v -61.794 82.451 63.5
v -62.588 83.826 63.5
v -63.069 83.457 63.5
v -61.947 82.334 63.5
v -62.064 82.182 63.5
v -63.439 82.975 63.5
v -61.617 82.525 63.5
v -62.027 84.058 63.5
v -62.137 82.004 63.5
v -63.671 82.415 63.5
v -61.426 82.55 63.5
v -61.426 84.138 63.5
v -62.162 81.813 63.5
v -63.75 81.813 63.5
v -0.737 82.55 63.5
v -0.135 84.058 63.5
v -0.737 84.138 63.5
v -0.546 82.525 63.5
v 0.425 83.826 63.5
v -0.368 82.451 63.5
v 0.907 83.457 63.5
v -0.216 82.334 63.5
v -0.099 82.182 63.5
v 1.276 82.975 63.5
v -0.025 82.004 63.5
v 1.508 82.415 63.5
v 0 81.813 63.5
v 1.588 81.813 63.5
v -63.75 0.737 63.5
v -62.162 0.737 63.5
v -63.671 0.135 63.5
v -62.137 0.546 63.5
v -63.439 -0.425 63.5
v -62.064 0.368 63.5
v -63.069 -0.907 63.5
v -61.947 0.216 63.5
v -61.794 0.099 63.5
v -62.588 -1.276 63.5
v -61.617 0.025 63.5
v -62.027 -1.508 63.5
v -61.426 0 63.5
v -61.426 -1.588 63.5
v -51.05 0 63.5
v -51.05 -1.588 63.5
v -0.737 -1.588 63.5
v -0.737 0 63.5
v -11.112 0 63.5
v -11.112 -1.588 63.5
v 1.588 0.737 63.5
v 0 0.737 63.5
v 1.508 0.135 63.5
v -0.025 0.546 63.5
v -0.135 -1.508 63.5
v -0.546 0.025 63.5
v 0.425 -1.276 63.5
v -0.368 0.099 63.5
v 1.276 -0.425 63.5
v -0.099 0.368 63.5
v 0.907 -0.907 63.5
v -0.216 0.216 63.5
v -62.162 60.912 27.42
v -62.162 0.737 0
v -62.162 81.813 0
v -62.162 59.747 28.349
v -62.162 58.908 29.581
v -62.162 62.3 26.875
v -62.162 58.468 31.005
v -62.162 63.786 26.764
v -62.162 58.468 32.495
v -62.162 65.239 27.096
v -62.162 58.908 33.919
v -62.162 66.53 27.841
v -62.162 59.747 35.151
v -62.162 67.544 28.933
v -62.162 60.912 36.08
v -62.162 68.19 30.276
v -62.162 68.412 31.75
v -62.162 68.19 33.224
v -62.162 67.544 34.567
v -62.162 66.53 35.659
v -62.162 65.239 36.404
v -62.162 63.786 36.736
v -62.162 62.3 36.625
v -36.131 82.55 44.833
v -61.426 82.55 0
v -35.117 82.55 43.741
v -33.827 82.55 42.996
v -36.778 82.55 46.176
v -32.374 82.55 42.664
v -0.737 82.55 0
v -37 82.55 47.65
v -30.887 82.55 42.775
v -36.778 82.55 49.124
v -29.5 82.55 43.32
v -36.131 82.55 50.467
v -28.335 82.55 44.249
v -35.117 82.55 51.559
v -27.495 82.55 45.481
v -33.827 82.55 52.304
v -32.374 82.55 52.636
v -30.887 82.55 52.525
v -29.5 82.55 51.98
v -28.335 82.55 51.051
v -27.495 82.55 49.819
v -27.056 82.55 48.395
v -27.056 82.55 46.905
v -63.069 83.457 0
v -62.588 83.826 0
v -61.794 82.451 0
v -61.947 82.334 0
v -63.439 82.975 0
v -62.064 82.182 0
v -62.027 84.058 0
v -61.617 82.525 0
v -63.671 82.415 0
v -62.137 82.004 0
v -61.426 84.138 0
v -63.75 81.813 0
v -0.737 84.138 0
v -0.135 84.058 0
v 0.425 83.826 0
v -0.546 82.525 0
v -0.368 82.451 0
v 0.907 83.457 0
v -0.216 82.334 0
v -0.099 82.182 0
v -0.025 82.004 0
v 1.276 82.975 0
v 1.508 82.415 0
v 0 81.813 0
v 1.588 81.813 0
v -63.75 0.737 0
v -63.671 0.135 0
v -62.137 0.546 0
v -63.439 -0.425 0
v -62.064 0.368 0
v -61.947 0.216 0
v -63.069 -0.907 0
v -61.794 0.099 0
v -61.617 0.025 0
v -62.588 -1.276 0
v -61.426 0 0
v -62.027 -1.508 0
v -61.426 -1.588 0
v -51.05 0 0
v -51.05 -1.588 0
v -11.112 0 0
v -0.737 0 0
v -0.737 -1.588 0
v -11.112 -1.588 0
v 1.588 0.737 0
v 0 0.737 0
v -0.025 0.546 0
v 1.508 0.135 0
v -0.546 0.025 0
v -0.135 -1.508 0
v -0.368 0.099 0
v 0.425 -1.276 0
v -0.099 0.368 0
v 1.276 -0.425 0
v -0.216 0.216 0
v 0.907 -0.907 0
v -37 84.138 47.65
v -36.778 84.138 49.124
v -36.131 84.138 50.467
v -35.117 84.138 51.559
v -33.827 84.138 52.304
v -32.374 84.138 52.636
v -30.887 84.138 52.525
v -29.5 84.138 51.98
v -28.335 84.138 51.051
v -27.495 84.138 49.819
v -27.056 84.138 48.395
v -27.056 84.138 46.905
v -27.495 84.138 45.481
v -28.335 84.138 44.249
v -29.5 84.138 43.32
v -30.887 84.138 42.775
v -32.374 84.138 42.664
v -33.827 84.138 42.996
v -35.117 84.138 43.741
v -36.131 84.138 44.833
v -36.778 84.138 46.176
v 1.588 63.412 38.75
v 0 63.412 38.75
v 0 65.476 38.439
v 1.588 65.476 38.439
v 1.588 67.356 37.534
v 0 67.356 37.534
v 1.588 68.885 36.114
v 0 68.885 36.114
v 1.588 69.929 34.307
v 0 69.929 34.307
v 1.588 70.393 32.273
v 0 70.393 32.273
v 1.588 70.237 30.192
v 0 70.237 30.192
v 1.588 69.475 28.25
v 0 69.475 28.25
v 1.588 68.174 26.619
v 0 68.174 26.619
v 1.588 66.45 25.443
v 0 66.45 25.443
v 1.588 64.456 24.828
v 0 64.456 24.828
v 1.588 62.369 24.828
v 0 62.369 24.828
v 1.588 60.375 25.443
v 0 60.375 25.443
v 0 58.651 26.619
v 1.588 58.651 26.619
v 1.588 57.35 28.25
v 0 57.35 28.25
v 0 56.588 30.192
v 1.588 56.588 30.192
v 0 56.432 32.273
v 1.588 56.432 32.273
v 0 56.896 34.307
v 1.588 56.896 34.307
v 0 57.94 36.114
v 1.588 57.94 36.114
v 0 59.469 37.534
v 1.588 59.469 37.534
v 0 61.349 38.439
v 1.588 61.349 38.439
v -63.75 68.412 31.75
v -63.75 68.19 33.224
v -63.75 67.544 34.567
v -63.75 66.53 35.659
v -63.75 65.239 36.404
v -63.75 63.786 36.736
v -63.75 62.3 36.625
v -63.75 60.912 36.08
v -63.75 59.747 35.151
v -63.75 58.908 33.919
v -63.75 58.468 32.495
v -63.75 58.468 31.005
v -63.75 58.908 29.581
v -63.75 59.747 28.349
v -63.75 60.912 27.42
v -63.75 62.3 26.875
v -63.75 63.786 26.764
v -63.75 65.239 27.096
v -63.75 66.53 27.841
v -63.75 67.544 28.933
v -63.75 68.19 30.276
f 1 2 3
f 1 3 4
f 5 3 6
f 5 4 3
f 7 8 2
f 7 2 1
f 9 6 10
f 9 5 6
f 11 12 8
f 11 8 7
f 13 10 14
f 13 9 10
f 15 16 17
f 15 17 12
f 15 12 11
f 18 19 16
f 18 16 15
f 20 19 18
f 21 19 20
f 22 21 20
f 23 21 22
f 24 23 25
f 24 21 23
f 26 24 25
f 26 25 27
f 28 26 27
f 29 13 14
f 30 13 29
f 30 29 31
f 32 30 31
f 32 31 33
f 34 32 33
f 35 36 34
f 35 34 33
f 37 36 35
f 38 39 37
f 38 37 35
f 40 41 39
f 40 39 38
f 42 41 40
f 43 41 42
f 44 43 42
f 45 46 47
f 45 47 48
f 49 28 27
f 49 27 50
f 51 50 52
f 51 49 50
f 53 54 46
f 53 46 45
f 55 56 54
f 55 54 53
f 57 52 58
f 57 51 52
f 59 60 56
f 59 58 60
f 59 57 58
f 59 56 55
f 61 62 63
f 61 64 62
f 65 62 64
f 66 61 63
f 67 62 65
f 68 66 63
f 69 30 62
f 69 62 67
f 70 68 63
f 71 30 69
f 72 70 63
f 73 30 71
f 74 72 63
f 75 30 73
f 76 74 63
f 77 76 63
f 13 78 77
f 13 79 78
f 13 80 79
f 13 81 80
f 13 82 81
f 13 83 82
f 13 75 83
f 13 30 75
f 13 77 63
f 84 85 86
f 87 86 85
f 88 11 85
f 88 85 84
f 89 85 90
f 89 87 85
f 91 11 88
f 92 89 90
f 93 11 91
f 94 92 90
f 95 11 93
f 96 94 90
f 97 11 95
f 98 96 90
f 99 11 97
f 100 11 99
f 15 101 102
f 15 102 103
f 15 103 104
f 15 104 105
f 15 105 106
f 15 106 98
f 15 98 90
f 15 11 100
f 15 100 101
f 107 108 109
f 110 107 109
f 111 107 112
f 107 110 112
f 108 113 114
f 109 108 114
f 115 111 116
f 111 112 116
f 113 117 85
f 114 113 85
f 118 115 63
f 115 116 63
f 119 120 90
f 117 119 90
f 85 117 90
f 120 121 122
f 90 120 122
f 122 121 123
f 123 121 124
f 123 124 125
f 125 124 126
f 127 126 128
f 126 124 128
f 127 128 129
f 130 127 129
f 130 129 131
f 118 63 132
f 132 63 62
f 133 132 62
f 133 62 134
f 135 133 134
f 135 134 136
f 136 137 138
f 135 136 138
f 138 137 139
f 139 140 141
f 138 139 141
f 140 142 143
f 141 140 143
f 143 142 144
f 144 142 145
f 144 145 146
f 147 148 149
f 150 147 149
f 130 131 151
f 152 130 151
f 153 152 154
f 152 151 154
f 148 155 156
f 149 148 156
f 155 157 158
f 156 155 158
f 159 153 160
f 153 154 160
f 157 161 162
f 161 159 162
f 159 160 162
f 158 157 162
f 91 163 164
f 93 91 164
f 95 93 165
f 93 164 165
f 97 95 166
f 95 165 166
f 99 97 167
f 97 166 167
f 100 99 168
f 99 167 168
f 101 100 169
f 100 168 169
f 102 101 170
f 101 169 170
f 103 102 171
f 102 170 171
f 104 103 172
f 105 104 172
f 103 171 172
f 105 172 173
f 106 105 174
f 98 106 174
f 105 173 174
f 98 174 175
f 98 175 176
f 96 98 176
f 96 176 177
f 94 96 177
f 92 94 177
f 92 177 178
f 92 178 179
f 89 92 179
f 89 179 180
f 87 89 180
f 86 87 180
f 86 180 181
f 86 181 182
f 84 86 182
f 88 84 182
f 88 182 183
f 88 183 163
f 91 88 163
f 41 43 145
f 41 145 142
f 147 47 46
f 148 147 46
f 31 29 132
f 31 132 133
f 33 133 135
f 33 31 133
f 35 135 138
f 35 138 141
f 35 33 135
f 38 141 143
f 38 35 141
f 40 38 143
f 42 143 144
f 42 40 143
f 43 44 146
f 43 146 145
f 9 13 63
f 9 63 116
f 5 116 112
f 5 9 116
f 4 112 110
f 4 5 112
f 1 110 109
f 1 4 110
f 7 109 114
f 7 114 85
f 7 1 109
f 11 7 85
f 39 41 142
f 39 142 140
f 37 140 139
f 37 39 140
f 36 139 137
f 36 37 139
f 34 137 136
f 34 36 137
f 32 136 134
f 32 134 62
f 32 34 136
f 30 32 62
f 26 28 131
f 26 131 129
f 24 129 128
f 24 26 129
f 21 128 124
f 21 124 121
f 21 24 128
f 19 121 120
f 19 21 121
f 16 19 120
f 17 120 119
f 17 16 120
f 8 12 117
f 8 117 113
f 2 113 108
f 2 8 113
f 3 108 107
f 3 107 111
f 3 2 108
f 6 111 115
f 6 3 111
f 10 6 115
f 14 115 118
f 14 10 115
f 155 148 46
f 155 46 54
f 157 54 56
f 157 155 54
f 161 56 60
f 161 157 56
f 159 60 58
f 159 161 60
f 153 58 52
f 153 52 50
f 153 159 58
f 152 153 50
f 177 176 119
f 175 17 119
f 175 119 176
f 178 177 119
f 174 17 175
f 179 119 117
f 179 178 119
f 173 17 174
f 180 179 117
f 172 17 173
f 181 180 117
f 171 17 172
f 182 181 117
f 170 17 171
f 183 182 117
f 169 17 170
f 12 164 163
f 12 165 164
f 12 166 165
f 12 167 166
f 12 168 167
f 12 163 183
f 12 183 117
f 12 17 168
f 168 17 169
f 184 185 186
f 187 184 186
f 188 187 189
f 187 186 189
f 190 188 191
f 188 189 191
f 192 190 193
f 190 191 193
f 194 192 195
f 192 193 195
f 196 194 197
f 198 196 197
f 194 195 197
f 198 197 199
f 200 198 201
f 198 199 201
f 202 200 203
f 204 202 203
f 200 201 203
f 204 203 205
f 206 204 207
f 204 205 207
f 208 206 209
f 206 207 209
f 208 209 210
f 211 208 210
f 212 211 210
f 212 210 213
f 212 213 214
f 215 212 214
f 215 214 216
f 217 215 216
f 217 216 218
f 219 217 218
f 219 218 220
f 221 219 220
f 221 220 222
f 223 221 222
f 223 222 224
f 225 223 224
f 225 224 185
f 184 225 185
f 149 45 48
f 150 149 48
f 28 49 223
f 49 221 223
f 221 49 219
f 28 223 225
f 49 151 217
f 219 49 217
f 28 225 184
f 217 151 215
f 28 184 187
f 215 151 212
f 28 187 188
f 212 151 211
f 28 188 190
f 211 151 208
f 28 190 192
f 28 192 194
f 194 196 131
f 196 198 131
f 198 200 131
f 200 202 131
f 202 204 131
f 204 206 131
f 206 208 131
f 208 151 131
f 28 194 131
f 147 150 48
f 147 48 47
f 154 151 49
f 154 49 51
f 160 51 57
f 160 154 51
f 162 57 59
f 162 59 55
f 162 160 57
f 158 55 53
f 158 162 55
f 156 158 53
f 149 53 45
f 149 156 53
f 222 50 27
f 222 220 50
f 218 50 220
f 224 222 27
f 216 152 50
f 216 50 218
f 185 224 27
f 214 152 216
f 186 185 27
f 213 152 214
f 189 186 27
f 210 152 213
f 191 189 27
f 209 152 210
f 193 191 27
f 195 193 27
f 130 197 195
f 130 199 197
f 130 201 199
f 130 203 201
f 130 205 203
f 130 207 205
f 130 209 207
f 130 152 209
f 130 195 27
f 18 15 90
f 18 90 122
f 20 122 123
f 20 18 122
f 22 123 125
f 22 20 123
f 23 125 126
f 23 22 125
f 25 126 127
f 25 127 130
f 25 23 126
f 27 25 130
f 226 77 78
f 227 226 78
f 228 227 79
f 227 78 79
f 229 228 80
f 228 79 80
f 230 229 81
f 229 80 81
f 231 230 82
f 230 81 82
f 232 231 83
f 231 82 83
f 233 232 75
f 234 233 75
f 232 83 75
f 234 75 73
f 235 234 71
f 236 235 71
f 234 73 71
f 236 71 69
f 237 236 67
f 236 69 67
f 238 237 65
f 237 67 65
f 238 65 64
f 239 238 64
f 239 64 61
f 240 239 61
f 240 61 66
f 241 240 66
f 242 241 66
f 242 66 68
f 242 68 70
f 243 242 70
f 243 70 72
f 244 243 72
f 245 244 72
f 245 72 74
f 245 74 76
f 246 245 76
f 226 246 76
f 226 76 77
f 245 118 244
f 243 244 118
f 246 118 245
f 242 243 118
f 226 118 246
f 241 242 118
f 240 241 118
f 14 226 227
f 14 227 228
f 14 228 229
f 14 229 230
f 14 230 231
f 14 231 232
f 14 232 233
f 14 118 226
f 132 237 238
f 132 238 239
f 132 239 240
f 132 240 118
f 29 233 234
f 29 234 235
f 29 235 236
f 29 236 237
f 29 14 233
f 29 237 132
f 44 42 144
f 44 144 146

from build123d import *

# Parameters (mm, degrees)
SKETCH2_W                    = 1.5875
SKETCH2_H                    = 82.55
BASE_FLANGE1_DEPTH           = 63.5
EDGE_FLANGE1_STRIP_W         = 7.8232
EDGE_FLANGE1_STRIP_H         = 1.5875
EDGE_FLANGE1_STRIP_CUT_DEPTH = 63.5
EDGE_FLANGE1_DEPTH           = 63.5
SKETCH10_R                   = 7
CUT_EXTRUDE1_DEPTH           = 105.73891424
EDGE_FLANGE2_STRIP_W         = 7.8232
EDGE_FLANGE2_STRIP_H         = 1.5875
EDGE_FLANGE2_STRIP_CUT_DEPTH = 63.5
EDGE_FLANGE2_DEPTH           = 63.5
EDGE_FLANGE3_STRIP_W         = 7.8232
EDGE_FLANGE3_STRIP_H         = 1.5875
EDGE_FLANGE3_STRIP_CUT_DEPTH = 63.5
EDGE_FLANGE3_DEPTH           = 63.5
EDGE_FLANGE4_STRIP_W         = 7.8232
EDGE_FLANGE4_STRIP_H         = 1.5875
EDGE_FLANGE4_STRIP_CUT_DEPTH = 63.5
EDGE_FLANGE4_DEPTH           = 63.5
SKETCH20_R                   = 5
CUT_EXTRUDE2_DEPTH           = 125.278268888
SKETCH21_R                   = 5
CUT_EXTRUDE3_DEPTH           = 9.652


# Sheet-metal steps are written as plain solids
with BuildPart() as part:
    # Sketch2 → Base-Flange1 (new body)
    with BuildSketch(Plane.XY):
        with Locations((0.79375, 41.275)):
            Rectangle(SKETCH2_W, SKETCH2_H)
    extrude(amount=BASE_FLANGE1_DEPTH)

    # Edge-Flange1 strip (across the edge) → Edge-Flange1 strip cut (cut)
    with BuildSketch(Plane(origin=(0, 0, 0), x_dir=(0, 1, 0), z_dir=(0, 0, 1))):
        with Locations((-3.175, -0.79375)):
            Rectangle(EDGE_FLANGE1_STRIP_W, EDGE_FLANGE1_STRIP_H)
    extrude(amount=EDGE_FLANGE1_STRIP_CUT_DEPTH, mode=Mode.SUBTRACT)

    # Edge-Flange1 section (across the edge) → Edge-Flange1 (add)
    with BuildSketch(Plane(origin=(0, 0, 0), x_dir=(0, 1, 0), z_dir=(0, 0, 1))):
        with BuildLine():
            Line((-1.5875, 0.7366), (-1.5875, 11.1125))
            Line((-1.5875, 11.1125), (0, 11.1125))
            Line((0, 11.1125), (0, 0.7366))
            ThreePointArc((0, 0.7366), (0.215745145, 0.215745145), (0.7366, 0))
            Line((0.7366, 0), (0.7366, -1.5875))
            ThreePointArc((0.7366, -1.5875), (-0.90678687, -0.90678687), (-1.5875, 0.7366))
        make_face()
    extrude(amount=EDGE_FLANGE1_DEPTH)

    # Sketch10 → Cut-Extrude1 (cut, through all)
    with BuildSketch(Plane.ZY):
        with Locations((31.75, 63.4125)):
            Circle(SKETCH10_R)
    extrude(amount=-CUT_EXTRUDE1_DEPTH, mode=Mode.SUBTRACT)

    # Edge-Flange2 strip (across the edge) → Edge-Flange2 strip cut (cut)
    with BuildSketch(Plane(origin=(0, 82.55, 63.5), x_dir=(0, -1, 0), z_dir=(0, 0, -1))):
        with Locations((-3.175, -0.79375)):
            Rectangle(EDGE_FLANGE2_STRIP_W, EDGE_FLANGE2_STRIP_H)
    extrude(amount=EDGE_FLANGE2_STRIP_CUT_DEPTH, mode=Mode.SUBTRACT)

    # Edge-Flange2 section (across the edge) → Edge-Flange2 (add)
    with BuildSketch(Plane(origin=(0, 82.55, 63.5), x_dir=(0, -1, 0), z_dir=(0, 0, -1))):
        with BuildLine():
            Line((-1.5875, 0.7366), (-1.5875, 62.162499944))
            Line((-1.5875, 62.162499944), (0, 62.162499944))
            Line((0, 62.162499944), (0, 0.7366))
            ThreePointArc((0, 0.7366), (0.215745145, 0.215745145), (0.7366, 0))
            Line((0.7366, 0), (0.7366, -1.5875))
            ThreePointArc((0.7366, -1.5875), (-0.90678687, -0.90678687), (-1.5875, 0.7366))
        make_face()
    extrude(amount=EDGE_FLANGE2_DEPTH)

    # Edge-Flange3 strip (across the edge) → Edge-Flange3 strip cut (cut)
    with BuildSketch(Plane(origin=(-62.162499944, 82.55, 63.5), x_dir=(1, 0, 0), z_dir=(0, 0, -1))):
        with Locations((-3.175, -0.79375)):
            Rectangle(EDGE_FLANGE3_STRIP_W, EDGE_FLANGE3_STRIP_H)
    extrude(amount=EDGE_FLANGE3_STRIP_CUT_DEPTH, mode=Mode.SUBTRACT)

    # Edge-Flange3 section (across the edge) → Edge-Flange3 (add)
    with BuildSketch(Plane(origin=(-62.162499944, 82.55, 63.5), x_dir=(1, 0, 0), z_dir=(0, 0, -1))):
        with BuildLine():
            Line((-1.5875, 0.7366), (-1.5875, 82.55))
            Line((-1.5875, 82.55), (0, 82.55))
            Line((0, 82.55), (0, 0.7366))
            ThreePointArc((0, 0.7366), (0.215745145, 0.215745145), (0.7366, 0))
            Line((0.7366, 0), (0.7366, -1.5875))
            ThreePointArc((0.7366, -1.5875), (-0.90678687, -0.90678687), (-1.5875, 0.7366))
        make_face()
    extrude(amount=EDGE_FLANGE3_DEPTH)

    # Edge-Flange4 strip (across the edge) → Edge-Flange4 strip cut (cut)
    with BuildSketch(Plane(origin=(-62.162499944, 0, 63.5), x_dir=(0, 1, 0), z_dir=(0, 0, -1))):
        with Locations((-3.175, -0.79375)):
            Rectangle(EDGE_FLANGE4_STRIP_W, EDGE_FLANGE4_STRIP_H)
    extrude(amount=EDGE_FLANGE4_STRIP_CUT_DEPTH, mode=Mode.SUBTRACT)

    # Edge-Flange4 section (across the edge) → Edge-Flange4 (add)
    with BuildSketch(Plane(origin=(-62.162499944, 0, 63.5), x_dir=(0, 1, 0), z_dir=(0, 0, -1))):
        with BuildLine():
            Line((-1.5875, 0.7366), (-1.5875, 11.1125))
            Line((-1.5875, 11.1125), (0, 11.1125))
            Line((0, 11.1125), (0, 0.7366))
            ThreePointArc((0, 0.7366), (0.215745145, 0.215745145), (0.7366, 0))
            Line((0.7366, 0), (0.7366, -1.5875))
            ThreePointArc((0.7366, -1.5875), (-0.90678687, -0.90678687), (-1.5875, 0.7366))
        make_face()
    extrude(amount=EDGE_FLANGE4_DEPTH)

    # Sketch20 → Cut-Extrude2 (cut, through all)
    with BuildSketch(Plane(origin=(0, 84.1375, 0), x_dir=(1, 0, 0), z_dir=(0, 1, 0))):
        with Locations(Location((-32, -47.64999995, 0), (0, 0, 180))):
            Circle(SKETCH20_R)
    extrude(amount=-CUT_EXTRUDE2_DEPTH, mode=Mode.SUBTRACT)

    # Sketch21 → Cut-Extrude3 (cut)
    with BuildSketch(Plane(origin=(-62.162499944, 0, 0), x_dir=(0, 0, -1), z_dir=(1, 0, 0))):
        with Locations(Location((-31.75, 63.4125, 0), (0, 0, 90))):
            Circle(SKETCH21_R)
    extrude(amount=-CUT_EXTRUDE3_DEPTH, mode=Mode.SUBTRACT)


solid = part.part
